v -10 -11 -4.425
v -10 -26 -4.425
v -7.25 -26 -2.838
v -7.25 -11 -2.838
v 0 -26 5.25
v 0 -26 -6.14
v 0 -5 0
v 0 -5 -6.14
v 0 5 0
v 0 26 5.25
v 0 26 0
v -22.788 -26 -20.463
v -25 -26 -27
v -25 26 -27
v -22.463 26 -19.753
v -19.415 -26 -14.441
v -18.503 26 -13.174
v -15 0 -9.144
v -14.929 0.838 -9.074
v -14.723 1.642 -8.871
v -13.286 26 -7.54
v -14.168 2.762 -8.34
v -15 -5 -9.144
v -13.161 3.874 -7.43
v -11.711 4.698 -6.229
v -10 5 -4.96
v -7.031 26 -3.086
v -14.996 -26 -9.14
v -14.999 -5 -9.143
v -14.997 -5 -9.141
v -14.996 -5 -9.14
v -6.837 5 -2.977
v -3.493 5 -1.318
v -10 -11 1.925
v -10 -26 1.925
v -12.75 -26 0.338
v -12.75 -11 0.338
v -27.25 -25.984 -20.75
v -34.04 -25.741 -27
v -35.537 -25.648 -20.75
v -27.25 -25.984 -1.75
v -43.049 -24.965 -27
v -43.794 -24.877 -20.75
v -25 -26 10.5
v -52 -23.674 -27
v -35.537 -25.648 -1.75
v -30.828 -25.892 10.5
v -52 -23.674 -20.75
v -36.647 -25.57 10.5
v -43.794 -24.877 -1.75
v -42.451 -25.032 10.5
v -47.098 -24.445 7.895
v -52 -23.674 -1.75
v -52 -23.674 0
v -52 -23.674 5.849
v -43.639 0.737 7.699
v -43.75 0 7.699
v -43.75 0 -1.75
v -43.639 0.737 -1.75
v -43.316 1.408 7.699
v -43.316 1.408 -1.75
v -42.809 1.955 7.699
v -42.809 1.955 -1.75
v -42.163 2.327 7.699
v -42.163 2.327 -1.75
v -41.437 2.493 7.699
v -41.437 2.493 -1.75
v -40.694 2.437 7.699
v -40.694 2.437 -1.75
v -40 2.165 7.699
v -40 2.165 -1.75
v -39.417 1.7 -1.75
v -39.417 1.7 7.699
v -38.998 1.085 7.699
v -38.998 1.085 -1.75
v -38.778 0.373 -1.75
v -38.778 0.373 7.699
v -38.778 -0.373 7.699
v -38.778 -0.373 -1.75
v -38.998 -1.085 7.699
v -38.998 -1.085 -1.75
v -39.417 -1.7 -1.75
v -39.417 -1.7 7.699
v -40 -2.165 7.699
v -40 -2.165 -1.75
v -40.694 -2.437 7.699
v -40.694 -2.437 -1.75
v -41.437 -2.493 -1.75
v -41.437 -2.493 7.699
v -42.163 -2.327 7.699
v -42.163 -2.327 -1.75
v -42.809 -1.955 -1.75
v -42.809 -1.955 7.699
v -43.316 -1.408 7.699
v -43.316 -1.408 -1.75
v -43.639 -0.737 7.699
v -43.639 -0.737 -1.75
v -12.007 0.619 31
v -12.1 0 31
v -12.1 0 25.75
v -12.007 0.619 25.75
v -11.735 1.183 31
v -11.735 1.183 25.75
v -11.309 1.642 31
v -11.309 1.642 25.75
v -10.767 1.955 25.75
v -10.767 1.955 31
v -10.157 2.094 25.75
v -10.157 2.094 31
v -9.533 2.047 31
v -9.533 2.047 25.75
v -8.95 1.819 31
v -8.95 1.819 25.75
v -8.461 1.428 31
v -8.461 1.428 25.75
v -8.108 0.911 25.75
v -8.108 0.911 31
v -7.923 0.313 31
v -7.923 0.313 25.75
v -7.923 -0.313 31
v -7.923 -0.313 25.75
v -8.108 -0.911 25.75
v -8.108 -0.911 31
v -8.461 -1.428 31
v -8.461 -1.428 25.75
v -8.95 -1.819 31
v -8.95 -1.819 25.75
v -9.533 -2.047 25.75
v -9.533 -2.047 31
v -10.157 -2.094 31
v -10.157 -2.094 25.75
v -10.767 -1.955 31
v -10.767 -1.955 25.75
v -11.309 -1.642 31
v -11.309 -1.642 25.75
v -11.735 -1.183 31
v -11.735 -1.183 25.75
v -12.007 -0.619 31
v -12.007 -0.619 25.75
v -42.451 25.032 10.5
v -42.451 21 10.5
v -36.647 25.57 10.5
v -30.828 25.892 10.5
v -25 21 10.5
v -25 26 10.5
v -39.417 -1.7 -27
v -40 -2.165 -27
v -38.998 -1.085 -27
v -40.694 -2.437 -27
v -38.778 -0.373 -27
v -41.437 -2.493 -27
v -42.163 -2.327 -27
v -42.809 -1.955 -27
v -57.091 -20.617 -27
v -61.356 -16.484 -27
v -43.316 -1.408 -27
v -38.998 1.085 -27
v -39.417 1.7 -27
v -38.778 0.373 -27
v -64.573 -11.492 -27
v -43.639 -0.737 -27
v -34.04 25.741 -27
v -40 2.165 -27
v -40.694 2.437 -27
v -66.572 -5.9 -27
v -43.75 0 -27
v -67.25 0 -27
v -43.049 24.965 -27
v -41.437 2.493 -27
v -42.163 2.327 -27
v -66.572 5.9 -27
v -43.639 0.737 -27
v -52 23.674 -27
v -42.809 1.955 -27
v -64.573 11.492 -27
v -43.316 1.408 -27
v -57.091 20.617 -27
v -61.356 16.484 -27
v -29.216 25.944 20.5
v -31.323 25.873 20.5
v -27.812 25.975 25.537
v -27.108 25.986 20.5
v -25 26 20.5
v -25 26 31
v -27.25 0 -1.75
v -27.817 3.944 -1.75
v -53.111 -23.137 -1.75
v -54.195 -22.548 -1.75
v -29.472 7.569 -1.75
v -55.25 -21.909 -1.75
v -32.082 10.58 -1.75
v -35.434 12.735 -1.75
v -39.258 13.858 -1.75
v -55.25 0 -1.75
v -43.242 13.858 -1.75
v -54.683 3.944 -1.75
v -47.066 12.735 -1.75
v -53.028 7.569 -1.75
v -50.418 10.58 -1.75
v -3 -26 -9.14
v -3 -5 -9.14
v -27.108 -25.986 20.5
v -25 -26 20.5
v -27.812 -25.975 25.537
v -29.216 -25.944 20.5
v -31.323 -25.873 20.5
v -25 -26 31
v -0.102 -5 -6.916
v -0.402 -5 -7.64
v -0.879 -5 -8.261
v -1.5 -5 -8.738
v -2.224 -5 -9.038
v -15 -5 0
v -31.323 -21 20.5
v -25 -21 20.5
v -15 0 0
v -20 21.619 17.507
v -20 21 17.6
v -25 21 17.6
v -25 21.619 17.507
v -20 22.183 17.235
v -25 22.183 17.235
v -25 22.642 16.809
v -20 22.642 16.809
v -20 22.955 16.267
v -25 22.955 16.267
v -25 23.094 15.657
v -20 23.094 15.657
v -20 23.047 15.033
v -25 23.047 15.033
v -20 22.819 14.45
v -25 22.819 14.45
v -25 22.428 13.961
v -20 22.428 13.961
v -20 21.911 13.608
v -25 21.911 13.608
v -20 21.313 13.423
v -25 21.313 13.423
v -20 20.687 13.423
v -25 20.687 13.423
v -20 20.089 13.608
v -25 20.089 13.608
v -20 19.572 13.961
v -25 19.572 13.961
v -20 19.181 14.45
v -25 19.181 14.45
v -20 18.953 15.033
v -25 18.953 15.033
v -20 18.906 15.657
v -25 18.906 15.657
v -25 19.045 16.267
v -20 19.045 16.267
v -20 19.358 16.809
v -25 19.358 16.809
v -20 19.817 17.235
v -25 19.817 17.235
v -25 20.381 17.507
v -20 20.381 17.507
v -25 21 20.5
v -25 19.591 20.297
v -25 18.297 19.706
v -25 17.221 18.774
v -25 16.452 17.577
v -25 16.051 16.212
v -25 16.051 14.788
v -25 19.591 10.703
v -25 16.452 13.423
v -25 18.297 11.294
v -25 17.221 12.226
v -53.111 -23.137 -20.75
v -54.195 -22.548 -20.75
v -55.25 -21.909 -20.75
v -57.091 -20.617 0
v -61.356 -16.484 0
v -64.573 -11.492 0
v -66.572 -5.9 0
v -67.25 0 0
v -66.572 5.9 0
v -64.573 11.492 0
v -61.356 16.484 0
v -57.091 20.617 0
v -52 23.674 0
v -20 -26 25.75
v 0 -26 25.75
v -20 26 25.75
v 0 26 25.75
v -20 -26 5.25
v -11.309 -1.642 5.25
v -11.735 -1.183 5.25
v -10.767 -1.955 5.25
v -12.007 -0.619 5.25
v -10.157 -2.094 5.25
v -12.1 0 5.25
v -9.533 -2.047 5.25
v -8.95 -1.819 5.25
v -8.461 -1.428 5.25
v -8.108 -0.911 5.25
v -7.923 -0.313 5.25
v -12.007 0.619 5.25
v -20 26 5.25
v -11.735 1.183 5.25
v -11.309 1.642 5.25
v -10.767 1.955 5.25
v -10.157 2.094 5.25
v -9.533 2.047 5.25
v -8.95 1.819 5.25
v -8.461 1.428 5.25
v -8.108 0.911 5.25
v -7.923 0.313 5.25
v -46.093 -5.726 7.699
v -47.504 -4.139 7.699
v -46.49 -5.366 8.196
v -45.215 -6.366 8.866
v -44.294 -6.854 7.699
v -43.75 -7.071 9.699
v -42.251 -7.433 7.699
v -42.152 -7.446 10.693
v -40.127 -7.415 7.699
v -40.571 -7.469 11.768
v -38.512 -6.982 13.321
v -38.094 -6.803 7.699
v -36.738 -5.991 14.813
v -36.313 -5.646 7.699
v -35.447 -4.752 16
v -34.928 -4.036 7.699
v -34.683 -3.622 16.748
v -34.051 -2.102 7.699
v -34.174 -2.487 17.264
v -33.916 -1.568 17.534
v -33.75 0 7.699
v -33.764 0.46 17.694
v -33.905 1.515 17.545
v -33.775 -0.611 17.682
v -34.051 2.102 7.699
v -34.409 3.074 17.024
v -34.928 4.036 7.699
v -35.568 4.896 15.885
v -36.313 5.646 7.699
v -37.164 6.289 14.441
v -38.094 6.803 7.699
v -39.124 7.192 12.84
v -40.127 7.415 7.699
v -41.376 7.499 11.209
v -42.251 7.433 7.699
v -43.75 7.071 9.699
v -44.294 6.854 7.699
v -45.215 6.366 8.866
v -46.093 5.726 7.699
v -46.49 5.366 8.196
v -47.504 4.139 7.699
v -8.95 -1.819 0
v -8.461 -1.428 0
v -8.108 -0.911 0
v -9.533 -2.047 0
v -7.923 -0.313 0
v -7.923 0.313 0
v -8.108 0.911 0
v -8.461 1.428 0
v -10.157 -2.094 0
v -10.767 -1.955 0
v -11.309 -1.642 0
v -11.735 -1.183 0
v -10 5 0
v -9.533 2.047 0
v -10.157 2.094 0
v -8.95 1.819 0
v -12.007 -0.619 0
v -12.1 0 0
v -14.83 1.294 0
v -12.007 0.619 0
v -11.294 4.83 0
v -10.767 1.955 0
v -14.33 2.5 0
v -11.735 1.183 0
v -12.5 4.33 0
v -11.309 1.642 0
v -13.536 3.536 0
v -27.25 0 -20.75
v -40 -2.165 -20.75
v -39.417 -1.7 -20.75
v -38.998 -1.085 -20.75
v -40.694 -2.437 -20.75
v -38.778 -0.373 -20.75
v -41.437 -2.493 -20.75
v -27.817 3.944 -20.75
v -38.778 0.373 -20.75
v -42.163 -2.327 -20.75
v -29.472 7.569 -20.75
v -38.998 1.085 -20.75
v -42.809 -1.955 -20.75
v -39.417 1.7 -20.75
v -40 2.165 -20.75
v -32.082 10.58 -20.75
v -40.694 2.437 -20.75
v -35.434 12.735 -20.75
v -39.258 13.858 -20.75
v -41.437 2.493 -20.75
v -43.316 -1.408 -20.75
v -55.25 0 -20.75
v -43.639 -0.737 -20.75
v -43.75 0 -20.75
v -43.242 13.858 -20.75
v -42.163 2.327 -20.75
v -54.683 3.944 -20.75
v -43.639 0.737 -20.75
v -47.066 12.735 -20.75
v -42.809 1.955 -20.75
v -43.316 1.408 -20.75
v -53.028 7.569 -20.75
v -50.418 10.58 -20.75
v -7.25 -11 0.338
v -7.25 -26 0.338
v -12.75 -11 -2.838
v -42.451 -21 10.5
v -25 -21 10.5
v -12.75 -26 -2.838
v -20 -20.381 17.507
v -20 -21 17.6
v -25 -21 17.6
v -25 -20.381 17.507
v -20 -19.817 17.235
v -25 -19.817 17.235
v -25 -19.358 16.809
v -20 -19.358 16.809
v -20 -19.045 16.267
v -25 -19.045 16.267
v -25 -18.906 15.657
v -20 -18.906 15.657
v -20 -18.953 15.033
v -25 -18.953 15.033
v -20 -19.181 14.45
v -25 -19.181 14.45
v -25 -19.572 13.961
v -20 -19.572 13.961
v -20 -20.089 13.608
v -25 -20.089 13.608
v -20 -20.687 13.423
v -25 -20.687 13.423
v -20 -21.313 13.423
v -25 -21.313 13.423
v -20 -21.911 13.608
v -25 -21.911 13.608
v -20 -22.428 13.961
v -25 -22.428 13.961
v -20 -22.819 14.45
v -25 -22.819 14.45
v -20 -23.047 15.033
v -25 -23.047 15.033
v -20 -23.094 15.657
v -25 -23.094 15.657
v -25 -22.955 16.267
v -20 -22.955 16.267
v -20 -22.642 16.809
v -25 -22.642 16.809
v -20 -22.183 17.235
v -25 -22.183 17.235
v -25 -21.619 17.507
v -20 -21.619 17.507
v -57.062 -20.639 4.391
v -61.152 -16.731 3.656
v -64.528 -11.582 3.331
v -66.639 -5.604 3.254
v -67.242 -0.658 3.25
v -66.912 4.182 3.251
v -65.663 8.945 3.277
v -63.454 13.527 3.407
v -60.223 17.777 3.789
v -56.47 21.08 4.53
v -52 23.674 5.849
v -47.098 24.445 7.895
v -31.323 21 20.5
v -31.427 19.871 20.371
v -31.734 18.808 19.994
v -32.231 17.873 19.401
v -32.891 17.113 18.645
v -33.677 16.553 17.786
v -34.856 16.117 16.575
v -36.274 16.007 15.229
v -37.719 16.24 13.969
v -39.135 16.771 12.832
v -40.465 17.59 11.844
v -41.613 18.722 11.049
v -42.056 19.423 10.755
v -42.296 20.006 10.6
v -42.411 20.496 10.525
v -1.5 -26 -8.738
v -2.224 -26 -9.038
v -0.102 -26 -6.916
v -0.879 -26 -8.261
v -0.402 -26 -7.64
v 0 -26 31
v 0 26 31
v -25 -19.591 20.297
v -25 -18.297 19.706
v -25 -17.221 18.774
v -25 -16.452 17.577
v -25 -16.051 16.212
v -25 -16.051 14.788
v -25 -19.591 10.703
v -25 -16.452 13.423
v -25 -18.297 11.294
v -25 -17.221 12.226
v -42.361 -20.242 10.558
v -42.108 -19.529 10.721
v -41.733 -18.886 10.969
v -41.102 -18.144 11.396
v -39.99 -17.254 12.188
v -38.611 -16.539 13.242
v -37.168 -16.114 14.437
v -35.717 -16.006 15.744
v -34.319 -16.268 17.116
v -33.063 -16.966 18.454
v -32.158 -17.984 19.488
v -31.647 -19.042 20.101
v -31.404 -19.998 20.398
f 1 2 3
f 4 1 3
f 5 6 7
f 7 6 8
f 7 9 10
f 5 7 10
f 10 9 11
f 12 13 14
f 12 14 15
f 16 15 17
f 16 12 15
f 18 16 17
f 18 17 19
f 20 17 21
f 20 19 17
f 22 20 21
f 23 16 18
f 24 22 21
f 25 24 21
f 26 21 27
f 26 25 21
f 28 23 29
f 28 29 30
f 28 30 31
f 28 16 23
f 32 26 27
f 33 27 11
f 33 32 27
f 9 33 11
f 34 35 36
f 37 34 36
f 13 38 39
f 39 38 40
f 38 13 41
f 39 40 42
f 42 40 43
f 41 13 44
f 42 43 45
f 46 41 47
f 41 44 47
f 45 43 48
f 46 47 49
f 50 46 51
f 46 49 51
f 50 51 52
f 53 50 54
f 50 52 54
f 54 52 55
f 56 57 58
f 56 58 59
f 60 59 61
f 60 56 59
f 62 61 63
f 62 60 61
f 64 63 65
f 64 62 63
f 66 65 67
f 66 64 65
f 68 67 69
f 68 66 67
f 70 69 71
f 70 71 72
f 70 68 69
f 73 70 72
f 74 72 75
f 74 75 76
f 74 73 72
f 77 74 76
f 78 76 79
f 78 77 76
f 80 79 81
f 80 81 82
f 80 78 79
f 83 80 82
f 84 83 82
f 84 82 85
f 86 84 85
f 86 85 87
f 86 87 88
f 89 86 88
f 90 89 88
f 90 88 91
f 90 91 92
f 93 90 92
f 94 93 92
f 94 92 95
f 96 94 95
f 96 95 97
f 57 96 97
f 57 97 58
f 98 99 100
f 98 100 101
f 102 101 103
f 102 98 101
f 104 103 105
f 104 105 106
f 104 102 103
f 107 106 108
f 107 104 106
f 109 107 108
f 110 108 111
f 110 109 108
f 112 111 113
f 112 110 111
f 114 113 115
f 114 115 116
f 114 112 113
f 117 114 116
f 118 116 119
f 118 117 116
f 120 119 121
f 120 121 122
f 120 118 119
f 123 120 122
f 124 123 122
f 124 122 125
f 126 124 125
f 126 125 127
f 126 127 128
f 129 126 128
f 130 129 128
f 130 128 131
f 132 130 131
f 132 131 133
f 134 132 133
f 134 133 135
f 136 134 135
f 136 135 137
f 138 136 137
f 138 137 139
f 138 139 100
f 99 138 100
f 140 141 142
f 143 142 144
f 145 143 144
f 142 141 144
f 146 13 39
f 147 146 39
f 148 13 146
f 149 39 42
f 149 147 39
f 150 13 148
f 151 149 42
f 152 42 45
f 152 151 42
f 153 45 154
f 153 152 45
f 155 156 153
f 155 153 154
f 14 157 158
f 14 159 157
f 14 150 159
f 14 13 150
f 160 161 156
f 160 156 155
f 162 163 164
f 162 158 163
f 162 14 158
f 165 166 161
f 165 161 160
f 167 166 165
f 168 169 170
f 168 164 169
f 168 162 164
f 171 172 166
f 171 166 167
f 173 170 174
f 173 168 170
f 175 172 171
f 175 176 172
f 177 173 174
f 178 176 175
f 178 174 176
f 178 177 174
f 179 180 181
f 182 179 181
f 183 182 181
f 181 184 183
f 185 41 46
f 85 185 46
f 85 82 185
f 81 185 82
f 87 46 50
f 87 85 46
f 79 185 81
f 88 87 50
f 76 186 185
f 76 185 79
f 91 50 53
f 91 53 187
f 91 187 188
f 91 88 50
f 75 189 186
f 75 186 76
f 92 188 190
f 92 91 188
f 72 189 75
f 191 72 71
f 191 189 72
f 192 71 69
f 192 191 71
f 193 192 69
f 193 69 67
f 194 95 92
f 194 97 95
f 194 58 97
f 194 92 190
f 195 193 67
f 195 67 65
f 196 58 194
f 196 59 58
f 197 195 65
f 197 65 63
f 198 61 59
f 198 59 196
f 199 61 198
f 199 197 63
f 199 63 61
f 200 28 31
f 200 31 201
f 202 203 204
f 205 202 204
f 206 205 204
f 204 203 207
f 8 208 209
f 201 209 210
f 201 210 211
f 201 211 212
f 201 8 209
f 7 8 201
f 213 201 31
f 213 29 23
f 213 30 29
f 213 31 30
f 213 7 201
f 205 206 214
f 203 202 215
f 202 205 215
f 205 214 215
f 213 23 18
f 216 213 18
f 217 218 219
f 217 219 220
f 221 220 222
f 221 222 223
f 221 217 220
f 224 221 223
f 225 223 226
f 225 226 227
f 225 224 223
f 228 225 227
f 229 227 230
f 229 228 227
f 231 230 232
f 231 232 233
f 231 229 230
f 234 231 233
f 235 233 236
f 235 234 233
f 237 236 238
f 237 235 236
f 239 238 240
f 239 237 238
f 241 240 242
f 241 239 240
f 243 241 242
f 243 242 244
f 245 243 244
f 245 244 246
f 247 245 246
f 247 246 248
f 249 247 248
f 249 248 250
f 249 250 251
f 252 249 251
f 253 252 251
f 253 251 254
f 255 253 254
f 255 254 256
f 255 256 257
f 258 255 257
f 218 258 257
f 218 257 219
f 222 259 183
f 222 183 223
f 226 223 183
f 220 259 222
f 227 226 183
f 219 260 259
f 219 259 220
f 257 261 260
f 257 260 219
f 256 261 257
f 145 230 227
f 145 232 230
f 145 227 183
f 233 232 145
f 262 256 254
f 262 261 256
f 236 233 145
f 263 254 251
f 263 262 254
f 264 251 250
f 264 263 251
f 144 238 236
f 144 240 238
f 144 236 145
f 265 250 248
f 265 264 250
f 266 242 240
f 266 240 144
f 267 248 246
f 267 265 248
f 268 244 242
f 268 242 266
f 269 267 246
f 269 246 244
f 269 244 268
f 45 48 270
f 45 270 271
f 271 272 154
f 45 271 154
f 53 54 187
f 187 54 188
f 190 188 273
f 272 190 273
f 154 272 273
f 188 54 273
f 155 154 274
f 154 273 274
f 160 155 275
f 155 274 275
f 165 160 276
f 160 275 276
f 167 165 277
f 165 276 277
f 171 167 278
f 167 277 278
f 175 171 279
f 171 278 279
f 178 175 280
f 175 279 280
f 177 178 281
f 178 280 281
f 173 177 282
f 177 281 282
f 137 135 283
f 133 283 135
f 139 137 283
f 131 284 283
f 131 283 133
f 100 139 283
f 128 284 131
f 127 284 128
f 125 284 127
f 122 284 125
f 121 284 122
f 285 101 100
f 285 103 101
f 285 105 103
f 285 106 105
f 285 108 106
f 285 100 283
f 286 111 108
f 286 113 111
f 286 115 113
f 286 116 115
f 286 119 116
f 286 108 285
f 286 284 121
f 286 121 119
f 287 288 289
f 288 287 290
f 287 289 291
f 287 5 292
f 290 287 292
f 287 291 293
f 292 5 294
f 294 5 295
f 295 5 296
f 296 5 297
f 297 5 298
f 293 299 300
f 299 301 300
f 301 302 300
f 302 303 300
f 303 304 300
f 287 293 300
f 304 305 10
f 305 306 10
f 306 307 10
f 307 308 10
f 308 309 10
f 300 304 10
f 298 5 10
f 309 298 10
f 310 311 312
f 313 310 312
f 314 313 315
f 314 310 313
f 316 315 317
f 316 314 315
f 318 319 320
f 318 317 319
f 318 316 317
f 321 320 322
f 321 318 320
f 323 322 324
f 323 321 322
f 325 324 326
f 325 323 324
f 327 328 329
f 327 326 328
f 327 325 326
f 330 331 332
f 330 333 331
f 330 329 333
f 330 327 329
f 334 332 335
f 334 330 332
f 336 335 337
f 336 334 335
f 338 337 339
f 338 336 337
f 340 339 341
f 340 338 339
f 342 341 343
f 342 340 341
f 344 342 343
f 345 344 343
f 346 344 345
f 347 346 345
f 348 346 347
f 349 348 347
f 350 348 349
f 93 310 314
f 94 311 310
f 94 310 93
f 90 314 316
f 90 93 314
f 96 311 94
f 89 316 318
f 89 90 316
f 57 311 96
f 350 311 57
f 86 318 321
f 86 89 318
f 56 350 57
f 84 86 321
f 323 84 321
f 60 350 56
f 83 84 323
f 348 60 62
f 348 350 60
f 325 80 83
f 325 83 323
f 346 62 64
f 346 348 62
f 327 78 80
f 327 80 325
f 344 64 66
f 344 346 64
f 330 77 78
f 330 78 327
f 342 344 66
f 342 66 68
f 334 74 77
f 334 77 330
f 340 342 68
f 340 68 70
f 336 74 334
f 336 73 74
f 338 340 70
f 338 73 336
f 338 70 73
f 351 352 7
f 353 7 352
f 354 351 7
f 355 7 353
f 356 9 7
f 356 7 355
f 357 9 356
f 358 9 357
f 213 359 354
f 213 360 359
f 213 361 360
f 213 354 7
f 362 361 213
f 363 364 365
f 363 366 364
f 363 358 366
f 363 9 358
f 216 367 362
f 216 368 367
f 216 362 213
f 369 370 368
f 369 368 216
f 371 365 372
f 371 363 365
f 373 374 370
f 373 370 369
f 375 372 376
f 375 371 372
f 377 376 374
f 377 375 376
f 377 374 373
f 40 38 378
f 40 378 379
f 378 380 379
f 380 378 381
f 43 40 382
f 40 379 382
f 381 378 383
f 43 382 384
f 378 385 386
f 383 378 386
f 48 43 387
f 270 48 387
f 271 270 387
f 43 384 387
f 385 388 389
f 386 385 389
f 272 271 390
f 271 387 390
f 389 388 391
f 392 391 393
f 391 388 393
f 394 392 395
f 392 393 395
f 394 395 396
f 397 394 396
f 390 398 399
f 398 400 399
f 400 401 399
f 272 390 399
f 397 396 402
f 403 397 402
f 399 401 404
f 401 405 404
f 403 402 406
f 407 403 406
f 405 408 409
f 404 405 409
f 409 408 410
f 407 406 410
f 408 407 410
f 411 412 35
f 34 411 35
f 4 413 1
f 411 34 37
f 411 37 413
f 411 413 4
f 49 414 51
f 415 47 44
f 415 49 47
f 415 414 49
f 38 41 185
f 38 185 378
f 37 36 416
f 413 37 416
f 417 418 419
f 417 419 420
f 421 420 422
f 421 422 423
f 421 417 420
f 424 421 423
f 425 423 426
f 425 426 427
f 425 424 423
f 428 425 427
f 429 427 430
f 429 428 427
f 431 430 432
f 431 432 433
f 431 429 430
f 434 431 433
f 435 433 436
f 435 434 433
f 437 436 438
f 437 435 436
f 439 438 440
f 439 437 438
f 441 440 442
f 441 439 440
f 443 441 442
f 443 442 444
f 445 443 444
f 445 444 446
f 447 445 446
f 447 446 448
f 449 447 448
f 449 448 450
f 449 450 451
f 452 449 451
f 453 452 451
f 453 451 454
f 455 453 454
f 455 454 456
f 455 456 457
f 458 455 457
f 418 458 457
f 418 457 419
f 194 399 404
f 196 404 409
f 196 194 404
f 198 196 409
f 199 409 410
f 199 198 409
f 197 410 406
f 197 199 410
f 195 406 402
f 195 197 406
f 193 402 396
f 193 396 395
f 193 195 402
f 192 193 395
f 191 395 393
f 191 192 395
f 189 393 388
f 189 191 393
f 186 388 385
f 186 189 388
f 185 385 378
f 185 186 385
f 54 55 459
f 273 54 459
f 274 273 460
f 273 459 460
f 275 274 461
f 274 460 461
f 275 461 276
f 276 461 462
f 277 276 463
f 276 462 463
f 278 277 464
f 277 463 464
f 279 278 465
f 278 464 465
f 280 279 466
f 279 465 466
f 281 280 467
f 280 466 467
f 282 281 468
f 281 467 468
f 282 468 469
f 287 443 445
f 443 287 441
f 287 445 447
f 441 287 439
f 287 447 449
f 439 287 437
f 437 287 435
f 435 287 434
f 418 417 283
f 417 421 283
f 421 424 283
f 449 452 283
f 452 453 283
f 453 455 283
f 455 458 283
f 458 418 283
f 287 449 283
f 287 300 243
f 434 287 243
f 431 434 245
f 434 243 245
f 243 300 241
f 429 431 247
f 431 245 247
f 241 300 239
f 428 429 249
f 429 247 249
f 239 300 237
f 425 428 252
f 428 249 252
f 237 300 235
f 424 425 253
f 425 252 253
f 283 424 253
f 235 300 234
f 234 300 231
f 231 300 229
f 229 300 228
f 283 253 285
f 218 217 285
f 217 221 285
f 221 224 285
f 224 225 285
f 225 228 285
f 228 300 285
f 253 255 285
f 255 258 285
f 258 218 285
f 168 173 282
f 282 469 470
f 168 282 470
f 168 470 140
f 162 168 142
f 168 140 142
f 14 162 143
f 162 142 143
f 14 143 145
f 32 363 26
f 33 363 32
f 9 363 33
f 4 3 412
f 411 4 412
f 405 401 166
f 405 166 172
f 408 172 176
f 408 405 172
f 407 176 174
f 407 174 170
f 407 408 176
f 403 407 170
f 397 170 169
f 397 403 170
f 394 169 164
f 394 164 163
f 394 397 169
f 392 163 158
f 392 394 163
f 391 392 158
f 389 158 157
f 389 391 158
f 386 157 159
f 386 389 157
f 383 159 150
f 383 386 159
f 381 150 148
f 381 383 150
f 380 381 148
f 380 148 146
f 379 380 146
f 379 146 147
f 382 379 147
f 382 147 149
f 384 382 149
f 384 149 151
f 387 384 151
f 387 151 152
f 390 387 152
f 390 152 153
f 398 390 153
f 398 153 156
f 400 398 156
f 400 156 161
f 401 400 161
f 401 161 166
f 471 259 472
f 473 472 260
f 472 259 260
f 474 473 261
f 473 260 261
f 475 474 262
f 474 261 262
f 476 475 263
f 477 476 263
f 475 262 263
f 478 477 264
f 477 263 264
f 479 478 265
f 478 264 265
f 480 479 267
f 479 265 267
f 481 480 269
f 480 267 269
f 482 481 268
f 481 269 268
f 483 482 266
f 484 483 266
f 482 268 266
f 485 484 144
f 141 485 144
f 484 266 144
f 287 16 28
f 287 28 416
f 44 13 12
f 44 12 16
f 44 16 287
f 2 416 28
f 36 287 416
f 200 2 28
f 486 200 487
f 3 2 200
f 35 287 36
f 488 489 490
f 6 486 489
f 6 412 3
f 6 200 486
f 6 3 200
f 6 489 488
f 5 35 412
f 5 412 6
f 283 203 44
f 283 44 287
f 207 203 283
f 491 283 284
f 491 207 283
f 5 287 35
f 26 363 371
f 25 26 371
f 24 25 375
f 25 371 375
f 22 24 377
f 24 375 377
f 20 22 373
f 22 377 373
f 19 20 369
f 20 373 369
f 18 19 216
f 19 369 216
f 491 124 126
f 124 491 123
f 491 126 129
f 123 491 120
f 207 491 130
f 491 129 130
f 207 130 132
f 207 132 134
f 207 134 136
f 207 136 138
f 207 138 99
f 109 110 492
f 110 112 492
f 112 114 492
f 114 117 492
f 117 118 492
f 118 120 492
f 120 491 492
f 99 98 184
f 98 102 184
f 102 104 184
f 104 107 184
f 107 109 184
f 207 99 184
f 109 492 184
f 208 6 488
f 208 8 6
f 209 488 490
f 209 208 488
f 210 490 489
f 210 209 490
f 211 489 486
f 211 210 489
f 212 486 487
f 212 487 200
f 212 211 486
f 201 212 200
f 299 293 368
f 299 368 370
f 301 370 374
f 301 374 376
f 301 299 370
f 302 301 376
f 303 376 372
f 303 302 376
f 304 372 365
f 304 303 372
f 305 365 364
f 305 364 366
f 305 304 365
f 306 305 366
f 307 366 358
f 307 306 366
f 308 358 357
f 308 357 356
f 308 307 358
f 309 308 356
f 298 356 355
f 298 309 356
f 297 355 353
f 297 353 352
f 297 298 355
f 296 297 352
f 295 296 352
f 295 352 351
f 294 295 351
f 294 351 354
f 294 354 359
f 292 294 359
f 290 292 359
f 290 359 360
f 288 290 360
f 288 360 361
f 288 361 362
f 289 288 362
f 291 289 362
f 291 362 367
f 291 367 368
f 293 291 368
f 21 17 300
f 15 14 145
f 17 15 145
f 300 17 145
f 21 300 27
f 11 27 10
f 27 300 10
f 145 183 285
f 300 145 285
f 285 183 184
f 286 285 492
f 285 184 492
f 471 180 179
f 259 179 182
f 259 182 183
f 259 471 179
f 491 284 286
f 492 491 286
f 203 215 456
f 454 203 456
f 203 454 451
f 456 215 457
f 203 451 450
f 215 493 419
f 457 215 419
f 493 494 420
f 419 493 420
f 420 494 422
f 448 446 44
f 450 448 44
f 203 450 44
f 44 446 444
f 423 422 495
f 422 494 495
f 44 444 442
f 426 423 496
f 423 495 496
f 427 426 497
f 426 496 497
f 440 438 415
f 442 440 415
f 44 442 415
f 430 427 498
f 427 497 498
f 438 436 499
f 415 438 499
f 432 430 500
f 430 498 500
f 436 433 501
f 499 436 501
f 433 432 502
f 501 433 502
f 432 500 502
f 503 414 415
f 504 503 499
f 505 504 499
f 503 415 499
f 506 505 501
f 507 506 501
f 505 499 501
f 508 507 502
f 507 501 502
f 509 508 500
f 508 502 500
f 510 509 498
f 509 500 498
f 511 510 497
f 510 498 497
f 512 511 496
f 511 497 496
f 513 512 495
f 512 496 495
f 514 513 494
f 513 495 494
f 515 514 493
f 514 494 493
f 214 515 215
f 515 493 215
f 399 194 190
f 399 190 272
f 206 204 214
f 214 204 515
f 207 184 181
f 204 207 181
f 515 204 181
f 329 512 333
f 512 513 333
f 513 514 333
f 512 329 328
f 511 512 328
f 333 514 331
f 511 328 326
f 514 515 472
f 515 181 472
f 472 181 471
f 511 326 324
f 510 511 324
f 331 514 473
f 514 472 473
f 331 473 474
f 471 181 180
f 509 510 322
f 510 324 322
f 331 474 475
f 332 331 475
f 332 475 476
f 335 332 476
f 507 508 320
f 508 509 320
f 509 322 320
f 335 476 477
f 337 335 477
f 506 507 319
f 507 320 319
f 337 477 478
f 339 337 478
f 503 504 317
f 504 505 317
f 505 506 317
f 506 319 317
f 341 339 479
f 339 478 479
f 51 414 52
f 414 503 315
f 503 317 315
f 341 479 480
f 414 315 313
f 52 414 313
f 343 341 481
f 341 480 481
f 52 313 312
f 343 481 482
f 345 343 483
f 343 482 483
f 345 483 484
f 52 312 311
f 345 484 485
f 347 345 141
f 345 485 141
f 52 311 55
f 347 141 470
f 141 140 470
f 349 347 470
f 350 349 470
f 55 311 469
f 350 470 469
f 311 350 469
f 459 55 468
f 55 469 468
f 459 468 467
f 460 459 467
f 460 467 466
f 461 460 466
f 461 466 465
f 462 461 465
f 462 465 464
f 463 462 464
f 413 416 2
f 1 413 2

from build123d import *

# Parameters (mm, degrees)
SKETCH_1_W              = 52
SKETCH_1_H              = 52
EXTRUDE_1_DEPTH         = 31
SKETCH_2_W              = 20.5
SKETCH_2_H              = 52
CUT_EXTRUDE_1_DEPTH     = 20
SKETCH_5_R              = 26
EXTRUDE_2_DEPTH         = 31
CUT_EXTRUDE_2_DEPTH     = 32
SKETCH_7_W              = 20
SKETCH_7_H              = 20.5
CUT_EXTRUDE_3_DEPTH     = 53
EXTRUDE_3_DEPTH         = 27
SKETCH_10_W             = 19
SKETCH_10_H             = 14
SKETCH_11_W             = 19
SKETCH_11_H             = 28
CUT_EXTRUDE_4_DEPTH     = 27
EXTRUDE_4_DEPTH         = 52
SKETCH_13_R             = 2.1
CUT_EXTRUDE_5_DEPTH     = 59
SKETCH_14_R             = 2.1
CUT_EXTRUDE_6_DEPTH     = 48.25
SKETCH_15_R             = 5
CUT_EXTRUDE_7_DEPTH     = 43.2500001
SKETCH_17_W             = 10
SKETCH_17_H             = 42.25
CUT_EXTRUDE_8_DEPTH     = 6.0000001
SKETCH_18_R             = 5
CUT_EXTRUDE_9_DEPTH     = 28.0000001
SKETCH_19_R             = 2.5
CUT_EXTRUDE_10_DEPTH    = 59.0000001
CUT_EXTRUDE1_DEPTH      = 53.0000001
SKETCH3_R               = 7.5
CUT_EXTRUDE2_DEPTH      = 22.300523217
CUT_EXTRUDE2_DEPTH_BACK = 2
CUT_EXTRUDE_12_DEPTH    = 28.0000001
SKETCH_20_W             = 20
SKETCH_20_H             = 14.39
EXTRUDE_5_DEPTH         = 21
CUT_EXTRUDE_11_DEPTH    = 15
FILLET_1_R              = 3


with BuildPart() as part:
    # Эскиз1 → Бобышка-Вытянуть1 (new body)
    with BuildSketch(Plane.XY):
        with Locations((26, 0)):
            Rectangle(SKETCH_1_W, SKETCH_1_H)
    extrude(amount=EXTRUDE_1_DEPTH)

    # Эскиз2 → Вырез-Вытянуть1 (cut)
    with BuildSketch(Plane.ZY):
        with Locations((15.5, 0)):
            Rectangle(SKETCH_2_W, SKETCH_2_H)
    extrude(amount=-CUT_EXTRUDE_1_DEPTH, mode=Mode.SUBTRACT)

    # Эскиз5 → Бобышка-Вытянуть2 (add)
    with BuildSketch(Plane.XY.offset(31)):
        with Locations((41.25, 0)):
            Circle(SKETCH_5_R)
    extrude(amount=-EXTRUDE_2_DEPTH)

    # Эскиз6 → Вырез-Вытянуть2 (cut, through all)
    with BuildSketch(Plane.XY.offset(31)):
        with BuildLine():
            Line((52, 23.673561202), (52, 26))
            Line((52, 26), (25, 26))
            ThreePointArc((25, 26), (38.550021379, 25.417314778), (52, 23.673561202))
        make_face()
    cut_extrude_2 = extrude(amount=-CUT_EXTRUDE_2_DEPTH, mode=Mode.SUBTRACT)

    # Зеркальное отражение1: Вырез-Вытянуть2 across plane
    add(cut_extrude_2.mirror(Plane(origin=(0, 0, 0), x_dir=(0, 0, 1), z_dir=(0, -1, 0))), mode=Mode.SUBTRACT)

    # Эскиз7 → Вырез-Вытянуть3 (cut, through all)
    with BuildSketch(Plane(origin=(0, 26, 0), x_dir=(1, 0, 0), z_dir=(0, 1, 0))):
        with Locations((10, -15.5)):
            Rectangle(SKETCH_7_W, SKETCH_7_H)
    extrude(amount=-CUT_EXTRUDE_3_DEPTH, mode=Mode.SUBTRACT)

    # Эскиз9 → Бобышка-Вытянуть3 (add)
    with BuildSketch(Plane(origin=(0, 0, 0), x_dir=(-1, 0, 0), z_dir=(0, 0, -1))):
        with BuildLine():
            Line((-25, 26), (-25, -26))
            ThreePointArc((-25, -26), (-38.550021379, -25.417314778), (-52, -23.673561202))
            ThreePointArc((-52, -23.673561202), (-67.25, 0), (-52, 23.673561202))
            ThreePointArc((-52, 23.673561202), (-38.550021379, 25.417314778), (-25, 26))
        make_face()
    extrude(amount=EXTRUDE_3_DEPTH)

    # Эскиз10 → Вырез-Повернуть2 (revolve, cut)
    with BuildSketch(Plane.ZY.offset(-41.25)):
        with Locations((-11.25, 7)):
            Rectangle(SKETCH_10_W, SKETCH_10_H)
    revolve(axis=Axis((41.25, 0, -20.75), (0, 0, 1)), mode=Mode.SUBTRACT)

    # Эскиз11 → Вырез-Вытянуть4 (cut, through all)
    with BuildSketch(Plane(origin=(0, 0, 0), x_dir=(0, 0, -1), z_dir=(0, -1, 0))):
        with Locations((11.25, 41.25)):
            Rectangle(SKETCH_11_W, SKETCH_11_H)
    extrude(amount=CUT_EXTRUDE_4_DEPTH, mode=Mode.SUBTRACT)

    # Эскиз12 → Бобышка-Вытянуть4 (add)
    with BuildSketch(Plane.XZ.offset(26)):
        with BuildLine():
            Line((0, 0), (25, 0))
            Line((25, 0), (25, -27))
            ThreePointArc((25, -27), (16.039335617, -10.222837391), (0, 0))
        make_face()
    extrude(amount=-EXTRUDE_4_DEPTH)

    # Эскиз13 → Вырез-Вытянуть5 (cut, through all)
    with BuildSketch(Plane.XY.offset(31)):
        with Locations((10, 0)):
            Circle(SKETCH_13_R)
    extrude(amount=-CUT_EXTRUDE_5_DEPTH, mode=Mode.SUBTRACT)

    # Эскиз14 → Вырез-Вытянуть6 (cut, through all)
    with BuildSketch(Plane.ZY.offset(-20)):
        with Locations((15.5, -21)):
            Circle(SKETCH_14_R)
        with Locations((15.5, 21)):
            Circle(SKETCH_14_R)
    extrude(amount=-CUT_EXTRUDE_6_DEPTH, mode=Mode.SUBTRACT)

    # Эскиз15 → Вырез-Вытянуть7 (cut, through all)
    with BuildSketch(Plane(origin=(25, 0, 0), x_dir=(0, 0, -1), z_dir=(1, 0, 0))):
        with Locations((-15.5, 21)):
            Circle(SKETCH_15_R)
        with Locations((-15.5, -21)):
            Circle(SKETCH_15_R)
    extrude(amount=CUT_EXTRUDE_7_DEPTH, mode=Mode.SUBTRACT)

    # Эскиз17 → Вырез-Вытянуть8 (cut, through all)
    with BuildSketch(Plane(origin=(0, 21, 0), x_dir=(0, 0, -1), z_dir=(0, 1, 0))):
        with Locations((-15.5, -46.125)):
            Rectangle(SKETCH_17_W, SKETCH_17_H)
    cut_extrude_8 = extrude(amount=CUT_EXTRUDE_8_DEPTH, mode=Mode.SUBTRACT)

    # Зеркальное отражение2: Вырез-Вытянуть8 across plane
    add(cut_extrude_8.mirror(Plane(origin=(0, 0, 0), x_dir=(0, 0, 1), z_dir=(0, -1, 0))), mode=Mode.SUBTRACT)

    # Эскиз18 → Вырез-Вытянуть9 (cut, through all)
    with BuildSketch(Plane(origin=(0, 0, 0), x_dir=(-1, 0, 0), z_dir=(0, 0, -1))):
        with Locations((-10, 0)):
            Circle(SKETCH_18_R)
    extrude(amount=CUT_EXTRUDE_9_DEPTH, mode=Mode.SUBTRACT)

    # Эскиз19 → Вырез-Вытянуть10 (cut, through all)
    with BuildSketch(Plane.XY.offset(31)):
        with Locations((41.25, 0)):
            Circle(SKETCH_19_R)
    extrude(amount=-CUT_EXTRUDE_10_DEPTH, mode=Mode.SUBTRACT)


with BuildPart() as body_2:
    # Зеркальное отражение3: mirrored copy
    add(part.part.mirror(Plane.ZY))

    # Sketch1 → Cut-Extrude1 (cut, through all)
    with BuildSketch(Plane(origin=(0, 26, 0), x_dir=(1, 0, 0), z_dir=(0, 1, 0))):
        with BuildLine():
            Line((-67.25, -31), (-25, -31))
            ThreePointArc((-25, -31), (-41.975877859, -10.807868092), (-67.25, -3.25))
            Line((-67.25, -3.25), (-67.25, -31))
        make_face()
    extrude(amount=-CUT_EXTRUDE1_DEPTH, mode=Mode.SUBTRACT)

    # Sketch3 → Cut-Extrude2 (cut, two sides)
    with BuildSketch(Plane.XY.offset(9.699476883)) as cut_extrude2_sk:
        with Locations((-41.25, 0)):
            Circle(SKETCH3_R)
    extrude(amount=CUT_EXTRUDE2_DEPTH, mode=Mode.SUBTRACT)
    extrude(cut_extrude2_sk.sketch, amount=-CUT_EXTRUDE2_DEPTH_BACK, mode=Mode.SUBTRACT)

    # Эскиз23 → Вырез-Вытянуть12 (cut, through all)
    with BuildSketch(Plane(origin=(0, 0, 0), x_dir=(-1, 0, 0), z_dir=(0, 0, -1))):
        with BuildLine():
            Line((10, 5), (0, 5))
            Line((0, 5), (0, -5))
            Line((0, -5), (10, -5))
            Line((10, -5), (15, -5))
            Line((15, -5), (15, 0))
            ThreePointArc((15, 0), (13.535533906, 3.535533906), (10, 5))
        make_face()
    extrude(amount=CUT_EXTRUDE_12_DEPTH, mode=Mode.SUBTRACT)

    # Эскиз20 → Бобышка-Вытянуть5 (add)
    with BuildSketch(Plane.XZ.offset(26)):
        with Locations((-10, -1.945)):
            Rectangle(SKETCH_20_W, SKETCH_20_H)
    extrude(amount=-EXTRUDE_5_DEPTH)

    # Эскиз22 → Вырез-Вытянуть11 (cut)
    with BuildSketch(Plane.XZ.offset(26)):
        Polygon((-10, 1.925426481), (-12.75, 0.33771324), (-12.75, -2.83771324), (-10, -4.425426481), (-7.25, -2.83771324), (-7.25, 0.33771324), align=None)
    extrude(amount=-CUT_EXTRUDE_11_DEPTH, mode=Mode.SUBTRACT)

    # Скругление1
    fillet_1_edges = [body_2.edges().sort_by_distance(p)[0] for p in [
        (0, -15.5, -9.14),
    ]]
    fillet(fillet_1_edges, radius=FILLET_1_R)


solid = body_2.part
